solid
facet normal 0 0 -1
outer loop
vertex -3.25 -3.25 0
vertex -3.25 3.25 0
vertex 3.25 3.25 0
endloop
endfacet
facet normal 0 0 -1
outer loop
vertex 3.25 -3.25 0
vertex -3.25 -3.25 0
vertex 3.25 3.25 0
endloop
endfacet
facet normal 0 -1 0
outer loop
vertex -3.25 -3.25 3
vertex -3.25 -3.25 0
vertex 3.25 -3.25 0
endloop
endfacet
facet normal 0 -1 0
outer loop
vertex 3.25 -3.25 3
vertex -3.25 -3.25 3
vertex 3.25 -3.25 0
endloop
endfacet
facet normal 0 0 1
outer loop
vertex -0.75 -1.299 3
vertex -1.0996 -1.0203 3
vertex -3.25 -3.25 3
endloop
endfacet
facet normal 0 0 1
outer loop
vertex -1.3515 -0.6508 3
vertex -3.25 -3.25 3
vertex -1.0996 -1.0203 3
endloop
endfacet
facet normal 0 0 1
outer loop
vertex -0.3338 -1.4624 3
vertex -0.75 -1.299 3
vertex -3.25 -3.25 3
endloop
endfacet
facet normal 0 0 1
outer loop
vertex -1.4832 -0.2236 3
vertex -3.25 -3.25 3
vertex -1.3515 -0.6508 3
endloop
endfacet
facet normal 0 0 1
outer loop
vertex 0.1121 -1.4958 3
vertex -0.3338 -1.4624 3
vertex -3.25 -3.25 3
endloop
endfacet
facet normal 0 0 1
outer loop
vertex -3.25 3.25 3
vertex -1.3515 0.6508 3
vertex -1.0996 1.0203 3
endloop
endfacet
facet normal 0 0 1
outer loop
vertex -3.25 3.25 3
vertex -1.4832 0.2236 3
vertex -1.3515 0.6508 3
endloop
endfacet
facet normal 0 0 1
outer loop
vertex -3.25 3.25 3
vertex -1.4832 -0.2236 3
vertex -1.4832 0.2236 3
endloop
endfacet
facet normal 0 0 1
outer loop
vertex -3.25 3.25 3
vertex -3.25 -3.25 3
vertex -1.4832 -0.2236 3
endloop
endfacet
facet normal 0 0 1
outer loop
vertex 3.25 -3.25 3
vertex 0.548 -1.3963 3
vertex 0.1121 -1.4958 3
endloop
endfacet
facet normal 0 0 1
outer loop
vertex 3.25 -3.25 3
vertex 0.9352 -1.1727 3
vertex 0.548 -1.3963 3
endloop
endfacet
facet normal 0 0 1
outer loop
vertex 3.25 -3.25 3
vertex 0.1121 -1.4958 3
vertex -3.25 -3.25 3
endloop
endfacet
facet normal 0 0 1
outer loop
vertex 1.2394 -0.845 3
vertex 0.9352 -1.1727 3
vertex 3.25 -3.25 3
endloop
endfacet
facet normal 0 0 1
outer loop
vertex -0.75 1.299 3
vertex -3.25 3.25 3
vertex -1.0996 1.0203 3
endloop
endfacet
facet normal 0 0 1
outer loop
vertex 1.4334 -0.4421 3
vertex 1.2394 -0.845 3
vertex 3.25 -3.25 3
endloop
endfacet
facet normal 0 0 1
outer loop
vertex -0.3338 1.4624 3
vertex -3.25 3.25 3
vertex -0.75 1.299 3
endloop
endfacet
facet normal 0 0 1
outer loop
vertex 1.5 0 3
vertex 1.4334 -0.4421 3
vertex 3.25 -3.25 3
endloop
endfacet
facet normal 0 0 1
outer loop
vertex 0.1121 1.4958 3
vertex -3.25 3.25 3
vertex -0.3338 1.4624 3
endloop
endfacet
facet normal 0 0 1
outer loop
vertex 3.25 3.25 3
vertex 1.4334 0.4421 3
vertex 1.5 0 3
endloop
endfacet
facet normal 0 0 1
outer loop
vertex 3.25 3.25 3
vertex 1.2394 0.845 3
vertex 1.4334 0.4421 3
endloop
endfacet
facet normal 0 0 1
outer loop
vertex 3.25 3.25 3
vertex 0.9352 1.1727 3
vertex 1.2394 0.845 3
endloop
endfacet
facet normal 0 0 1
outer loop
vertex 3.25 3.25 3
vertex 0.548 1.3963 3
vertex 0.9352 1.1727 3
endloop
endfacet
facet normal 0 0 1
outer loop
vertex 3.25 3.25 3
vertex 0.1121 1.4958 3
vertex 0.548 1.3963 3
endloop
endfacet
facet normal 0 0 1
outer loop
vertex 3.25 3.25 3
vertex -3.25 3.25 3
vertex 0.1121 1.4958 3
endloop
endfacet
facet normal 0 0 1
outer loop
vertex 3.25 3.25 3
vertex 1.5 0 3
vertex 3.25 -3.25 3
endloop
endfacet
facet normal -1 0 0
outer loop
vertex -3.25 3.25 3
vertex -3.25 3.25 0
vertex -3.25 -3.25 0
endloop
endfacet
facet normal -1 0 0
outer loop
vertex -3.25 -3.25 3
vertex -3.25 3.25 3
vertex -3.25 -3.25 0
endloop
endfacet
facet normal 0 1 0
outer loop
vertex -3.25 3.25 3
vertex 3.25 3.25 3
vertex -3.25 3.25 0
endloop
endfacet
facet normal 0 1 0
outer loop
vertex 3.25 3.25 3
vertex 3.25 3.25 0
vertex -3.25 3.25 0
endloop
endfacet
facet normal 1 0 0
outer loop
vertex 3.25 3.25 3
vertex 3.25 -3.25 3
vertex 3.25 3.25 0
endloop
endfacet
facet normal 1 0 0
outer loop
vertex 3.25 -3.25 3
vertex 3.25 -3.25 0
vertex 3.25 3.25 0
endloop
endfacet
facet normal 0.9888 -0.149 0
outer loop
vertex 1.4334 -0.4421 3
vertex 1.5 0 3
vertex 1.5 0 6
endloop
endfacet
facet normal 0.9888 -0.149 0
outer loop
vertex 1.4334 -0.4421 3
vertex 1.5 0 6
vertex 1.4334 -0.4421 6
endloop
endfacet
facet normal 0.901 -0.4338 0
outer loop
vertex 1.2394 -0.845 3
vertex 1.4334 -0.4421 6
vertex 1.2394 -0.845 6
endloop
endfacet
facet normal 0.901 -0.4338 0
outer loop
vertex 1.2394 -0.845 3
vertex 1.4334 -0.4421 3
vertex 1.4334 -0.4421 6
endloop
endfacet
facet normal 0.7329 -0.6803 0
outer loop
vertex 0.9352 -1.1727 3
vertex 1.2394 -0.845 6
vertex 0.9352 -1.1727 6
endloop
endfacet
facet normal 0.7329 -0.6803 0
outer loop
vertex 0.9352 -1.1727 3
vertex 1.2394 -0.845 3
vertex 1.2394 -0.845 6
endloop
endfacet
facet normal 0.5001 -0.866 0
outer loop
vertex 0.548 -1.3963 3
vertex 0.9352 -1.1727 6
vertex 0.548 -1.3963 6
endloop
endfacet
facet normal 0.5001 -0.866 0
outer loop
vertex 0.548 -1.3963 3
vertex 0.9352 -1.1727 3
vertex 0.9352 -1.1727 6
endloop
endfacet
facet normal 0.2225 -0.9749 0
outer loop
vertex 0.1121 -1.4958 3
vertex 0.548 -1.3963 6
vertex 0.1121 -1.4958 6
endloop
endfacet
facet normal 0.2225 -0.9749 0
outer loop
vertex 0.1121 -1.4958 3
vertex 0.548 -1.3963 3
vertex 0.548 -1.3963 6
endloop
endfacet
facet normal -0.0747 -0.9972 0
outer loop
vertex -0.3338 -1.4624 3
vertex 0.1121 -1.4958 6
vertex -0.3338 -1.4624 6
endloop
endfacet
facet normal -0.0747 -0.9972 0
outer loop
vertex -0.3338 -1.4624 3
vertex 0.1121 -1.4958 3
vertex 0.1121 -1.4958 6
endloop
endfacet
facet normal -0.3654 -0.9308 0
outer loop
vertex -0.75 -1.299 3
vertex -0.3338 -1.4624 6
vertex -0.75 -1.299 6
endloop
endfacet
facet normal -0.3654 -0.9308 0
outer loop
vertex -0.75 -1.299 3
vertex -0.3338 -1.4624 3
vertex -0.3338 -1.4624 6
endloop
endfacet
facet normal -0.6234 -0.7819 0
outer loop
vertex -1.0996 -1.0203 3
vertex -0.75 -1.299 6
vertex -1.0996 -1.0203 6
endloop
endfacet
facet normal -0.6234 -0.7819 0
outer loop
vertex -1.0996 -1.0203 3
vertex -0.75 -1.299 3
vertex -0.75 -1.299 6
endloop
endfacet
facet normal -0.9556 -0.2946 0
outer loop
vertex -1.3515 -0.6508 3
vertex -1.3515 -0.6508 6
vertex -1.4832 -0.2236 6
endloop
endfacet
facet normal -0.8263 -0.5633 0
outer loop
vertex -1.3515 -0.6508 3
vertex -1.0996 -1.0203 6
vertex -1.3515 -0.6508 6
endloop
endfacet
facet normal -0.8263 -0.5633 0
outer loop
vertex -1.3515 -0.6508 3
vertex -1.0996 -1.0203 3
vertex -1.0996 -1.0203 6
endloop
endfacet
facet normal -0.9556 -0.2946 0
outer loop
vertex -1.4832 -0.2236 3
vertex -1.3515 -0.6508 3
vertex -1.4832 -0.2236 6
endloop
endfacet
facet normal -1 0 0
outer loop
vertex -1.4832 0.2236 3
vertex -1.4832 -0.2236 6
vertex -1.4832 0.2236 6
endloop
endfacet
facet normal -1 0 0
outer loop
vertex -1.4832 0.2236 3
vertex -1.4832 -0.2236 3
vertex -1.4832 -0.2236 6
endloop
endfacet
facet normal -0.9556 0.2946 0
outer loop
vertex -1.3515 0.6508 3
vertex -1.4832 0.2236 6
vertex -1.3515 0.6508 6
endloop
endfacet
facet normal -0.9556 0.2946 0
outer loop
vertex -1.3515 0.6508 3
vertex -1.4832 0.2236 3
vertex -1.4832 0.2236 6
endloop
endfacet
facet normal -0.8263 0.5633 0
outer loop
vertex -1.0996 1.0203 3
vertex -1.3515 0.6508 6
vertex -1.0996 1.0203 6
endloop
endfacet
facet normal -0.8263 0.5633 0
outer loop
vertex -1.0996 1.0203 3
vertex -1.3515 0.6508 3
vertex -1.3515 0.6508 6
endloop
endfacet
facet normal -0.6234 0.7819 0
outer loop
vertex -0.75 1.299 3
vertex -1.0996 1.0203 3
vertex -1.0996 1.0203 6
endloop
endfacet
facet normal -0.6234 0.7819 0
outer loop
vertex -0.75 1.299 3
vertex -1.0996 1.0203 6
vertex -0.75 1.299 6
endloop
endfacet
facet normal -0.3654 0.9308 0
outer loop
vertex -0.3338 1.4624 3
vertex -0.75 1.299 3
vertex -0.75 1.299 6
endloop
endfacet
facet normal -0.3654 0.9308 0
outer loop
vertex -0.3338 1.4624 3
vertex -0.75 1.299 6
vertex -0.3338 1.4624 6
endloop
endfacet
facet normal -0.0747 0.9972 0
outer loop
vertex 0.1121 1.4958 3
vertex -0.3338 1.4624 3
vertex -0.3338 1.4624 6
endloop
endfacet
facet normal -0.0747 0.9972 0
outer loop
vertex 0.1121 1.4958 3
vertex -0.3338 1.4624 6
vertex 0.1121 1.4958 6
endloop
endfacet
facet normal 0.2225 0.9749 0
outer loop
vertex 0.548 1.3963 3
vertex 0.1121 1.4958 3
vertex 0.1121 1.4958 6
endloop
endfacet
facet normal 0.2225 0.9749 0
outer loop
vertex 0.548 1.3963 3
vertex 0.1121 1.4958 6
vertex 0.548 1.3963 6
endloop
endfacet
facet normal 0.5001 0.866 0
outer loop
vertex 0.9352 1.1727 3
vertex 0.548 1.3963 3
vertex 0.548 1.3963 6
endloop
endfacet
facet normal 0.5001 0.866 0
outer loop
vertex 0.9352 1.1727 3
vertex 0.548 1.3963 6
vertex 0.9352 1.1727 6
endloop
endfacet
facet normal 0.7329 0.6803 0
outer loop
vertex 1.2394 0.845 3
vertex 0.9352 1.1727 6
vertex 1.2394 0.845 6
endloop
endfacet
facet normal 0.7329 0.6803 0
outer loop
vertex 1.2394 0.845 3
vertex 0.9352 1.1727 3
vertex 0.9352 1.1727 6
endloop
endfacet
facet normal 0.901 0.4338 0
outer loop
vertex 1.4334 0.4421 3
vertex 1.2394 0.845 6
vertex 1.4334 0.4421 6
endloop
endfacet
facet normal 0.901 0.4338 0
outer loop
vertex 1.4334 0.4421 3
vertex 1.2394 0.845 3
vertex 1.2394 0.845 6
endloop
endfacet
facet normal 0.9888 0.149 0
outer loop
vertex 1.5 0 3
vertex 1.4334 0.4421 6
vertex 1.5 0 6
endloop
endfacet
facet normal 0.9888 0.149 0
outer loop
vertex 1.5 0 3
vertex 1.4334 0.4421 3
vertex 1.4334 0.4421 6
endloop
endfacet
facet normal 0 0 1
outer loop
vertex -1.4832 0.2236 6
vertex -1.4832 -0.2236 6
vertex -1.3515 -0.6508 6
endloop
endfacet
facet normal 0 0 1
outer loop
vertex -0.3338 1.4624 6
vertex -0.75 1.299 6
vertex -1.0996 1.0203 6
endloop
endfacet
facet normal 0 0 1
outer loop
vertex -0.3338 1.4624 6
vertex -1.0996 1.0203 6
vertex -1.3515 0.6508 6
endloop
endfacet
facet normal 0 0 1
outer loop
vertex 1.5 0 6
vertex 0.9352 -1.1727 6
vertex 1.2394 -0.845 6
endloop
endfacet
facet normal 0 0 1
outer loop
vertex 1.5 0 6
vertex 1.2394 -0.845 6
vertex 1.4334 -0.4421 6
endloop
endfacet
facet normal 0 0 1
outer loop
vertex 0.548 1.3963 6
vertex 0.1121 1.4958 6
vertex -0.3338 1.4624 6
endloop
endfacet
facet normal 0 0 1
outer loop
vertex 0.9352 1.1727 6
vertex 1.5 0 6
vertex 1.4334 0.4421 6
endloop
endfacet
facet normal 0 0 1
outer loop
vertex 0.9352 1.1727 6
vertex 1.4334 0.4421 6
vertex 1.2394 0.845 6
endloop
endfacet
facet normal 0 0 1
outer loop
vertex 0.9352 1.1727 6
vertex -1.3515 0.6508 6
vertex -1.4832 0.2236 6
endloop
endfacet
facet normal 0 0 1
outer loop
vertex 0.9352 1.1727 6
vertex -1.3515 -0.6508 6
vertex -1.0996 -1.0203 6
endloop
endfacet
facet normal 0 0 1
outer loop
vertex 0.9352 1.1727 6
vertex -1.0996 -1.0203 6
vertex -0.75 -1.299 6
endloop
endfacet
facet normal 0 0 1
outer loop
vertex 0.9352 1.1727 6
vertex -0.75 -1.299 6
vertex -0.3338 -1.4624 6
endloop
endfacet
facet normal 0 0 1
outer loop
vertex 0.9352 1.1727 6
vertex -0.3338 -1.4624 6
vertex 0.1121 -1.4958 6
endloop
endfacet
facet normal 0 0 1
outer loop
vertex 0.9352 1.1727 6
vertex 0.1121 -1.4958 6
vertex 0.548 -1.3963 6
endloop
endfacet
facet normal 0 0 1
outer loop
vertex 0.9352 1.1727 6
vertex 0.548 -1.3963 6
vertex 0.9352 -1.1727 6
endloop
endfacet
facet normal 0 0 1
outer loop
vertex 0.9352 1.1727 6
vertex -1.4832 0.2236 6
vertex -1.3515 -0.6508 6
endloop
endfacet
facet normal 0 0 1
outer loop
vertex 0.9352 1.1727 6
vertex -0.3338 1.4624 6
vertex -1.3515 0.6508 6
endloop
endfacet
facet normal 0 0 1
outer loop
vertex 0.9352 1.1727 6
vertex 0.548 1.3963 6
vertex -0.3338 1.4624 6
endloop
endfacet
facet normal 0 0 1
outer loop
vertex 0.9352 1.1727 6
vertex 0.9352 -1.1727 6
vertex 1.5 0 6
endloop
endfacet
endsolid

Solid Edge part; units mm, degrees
sketch "Sketch1" plane through (0, 0, 0) normal (0, 0, 1) x (1, 0, 0)
  line L0 (-3.25, -3.25) -> (3.25, -3.25)
  line L1 (3.25, -3.25) -> (3.25, 3.25)
  line L2 (3.25, 3.25) -> (-3.25, 3.25)
  line L3 (-3.25, 3.25) -> (-3.25, -3.25)
  dimension "D1" = 6.5
extrude "Protrusion1" add sketch "Sketch1" along normal blind 3
sketch "Sketch2" plane through (0, 0, 3) normal (0, 0, 1) x (1, 0, 0)
  circle A0 centre (0, 0) radius 1.5
  dimension "D1" = 3
extrude "Ajout_matière_2" add sketch "Sketch2" along normal blind 3
properties material "Acier"
